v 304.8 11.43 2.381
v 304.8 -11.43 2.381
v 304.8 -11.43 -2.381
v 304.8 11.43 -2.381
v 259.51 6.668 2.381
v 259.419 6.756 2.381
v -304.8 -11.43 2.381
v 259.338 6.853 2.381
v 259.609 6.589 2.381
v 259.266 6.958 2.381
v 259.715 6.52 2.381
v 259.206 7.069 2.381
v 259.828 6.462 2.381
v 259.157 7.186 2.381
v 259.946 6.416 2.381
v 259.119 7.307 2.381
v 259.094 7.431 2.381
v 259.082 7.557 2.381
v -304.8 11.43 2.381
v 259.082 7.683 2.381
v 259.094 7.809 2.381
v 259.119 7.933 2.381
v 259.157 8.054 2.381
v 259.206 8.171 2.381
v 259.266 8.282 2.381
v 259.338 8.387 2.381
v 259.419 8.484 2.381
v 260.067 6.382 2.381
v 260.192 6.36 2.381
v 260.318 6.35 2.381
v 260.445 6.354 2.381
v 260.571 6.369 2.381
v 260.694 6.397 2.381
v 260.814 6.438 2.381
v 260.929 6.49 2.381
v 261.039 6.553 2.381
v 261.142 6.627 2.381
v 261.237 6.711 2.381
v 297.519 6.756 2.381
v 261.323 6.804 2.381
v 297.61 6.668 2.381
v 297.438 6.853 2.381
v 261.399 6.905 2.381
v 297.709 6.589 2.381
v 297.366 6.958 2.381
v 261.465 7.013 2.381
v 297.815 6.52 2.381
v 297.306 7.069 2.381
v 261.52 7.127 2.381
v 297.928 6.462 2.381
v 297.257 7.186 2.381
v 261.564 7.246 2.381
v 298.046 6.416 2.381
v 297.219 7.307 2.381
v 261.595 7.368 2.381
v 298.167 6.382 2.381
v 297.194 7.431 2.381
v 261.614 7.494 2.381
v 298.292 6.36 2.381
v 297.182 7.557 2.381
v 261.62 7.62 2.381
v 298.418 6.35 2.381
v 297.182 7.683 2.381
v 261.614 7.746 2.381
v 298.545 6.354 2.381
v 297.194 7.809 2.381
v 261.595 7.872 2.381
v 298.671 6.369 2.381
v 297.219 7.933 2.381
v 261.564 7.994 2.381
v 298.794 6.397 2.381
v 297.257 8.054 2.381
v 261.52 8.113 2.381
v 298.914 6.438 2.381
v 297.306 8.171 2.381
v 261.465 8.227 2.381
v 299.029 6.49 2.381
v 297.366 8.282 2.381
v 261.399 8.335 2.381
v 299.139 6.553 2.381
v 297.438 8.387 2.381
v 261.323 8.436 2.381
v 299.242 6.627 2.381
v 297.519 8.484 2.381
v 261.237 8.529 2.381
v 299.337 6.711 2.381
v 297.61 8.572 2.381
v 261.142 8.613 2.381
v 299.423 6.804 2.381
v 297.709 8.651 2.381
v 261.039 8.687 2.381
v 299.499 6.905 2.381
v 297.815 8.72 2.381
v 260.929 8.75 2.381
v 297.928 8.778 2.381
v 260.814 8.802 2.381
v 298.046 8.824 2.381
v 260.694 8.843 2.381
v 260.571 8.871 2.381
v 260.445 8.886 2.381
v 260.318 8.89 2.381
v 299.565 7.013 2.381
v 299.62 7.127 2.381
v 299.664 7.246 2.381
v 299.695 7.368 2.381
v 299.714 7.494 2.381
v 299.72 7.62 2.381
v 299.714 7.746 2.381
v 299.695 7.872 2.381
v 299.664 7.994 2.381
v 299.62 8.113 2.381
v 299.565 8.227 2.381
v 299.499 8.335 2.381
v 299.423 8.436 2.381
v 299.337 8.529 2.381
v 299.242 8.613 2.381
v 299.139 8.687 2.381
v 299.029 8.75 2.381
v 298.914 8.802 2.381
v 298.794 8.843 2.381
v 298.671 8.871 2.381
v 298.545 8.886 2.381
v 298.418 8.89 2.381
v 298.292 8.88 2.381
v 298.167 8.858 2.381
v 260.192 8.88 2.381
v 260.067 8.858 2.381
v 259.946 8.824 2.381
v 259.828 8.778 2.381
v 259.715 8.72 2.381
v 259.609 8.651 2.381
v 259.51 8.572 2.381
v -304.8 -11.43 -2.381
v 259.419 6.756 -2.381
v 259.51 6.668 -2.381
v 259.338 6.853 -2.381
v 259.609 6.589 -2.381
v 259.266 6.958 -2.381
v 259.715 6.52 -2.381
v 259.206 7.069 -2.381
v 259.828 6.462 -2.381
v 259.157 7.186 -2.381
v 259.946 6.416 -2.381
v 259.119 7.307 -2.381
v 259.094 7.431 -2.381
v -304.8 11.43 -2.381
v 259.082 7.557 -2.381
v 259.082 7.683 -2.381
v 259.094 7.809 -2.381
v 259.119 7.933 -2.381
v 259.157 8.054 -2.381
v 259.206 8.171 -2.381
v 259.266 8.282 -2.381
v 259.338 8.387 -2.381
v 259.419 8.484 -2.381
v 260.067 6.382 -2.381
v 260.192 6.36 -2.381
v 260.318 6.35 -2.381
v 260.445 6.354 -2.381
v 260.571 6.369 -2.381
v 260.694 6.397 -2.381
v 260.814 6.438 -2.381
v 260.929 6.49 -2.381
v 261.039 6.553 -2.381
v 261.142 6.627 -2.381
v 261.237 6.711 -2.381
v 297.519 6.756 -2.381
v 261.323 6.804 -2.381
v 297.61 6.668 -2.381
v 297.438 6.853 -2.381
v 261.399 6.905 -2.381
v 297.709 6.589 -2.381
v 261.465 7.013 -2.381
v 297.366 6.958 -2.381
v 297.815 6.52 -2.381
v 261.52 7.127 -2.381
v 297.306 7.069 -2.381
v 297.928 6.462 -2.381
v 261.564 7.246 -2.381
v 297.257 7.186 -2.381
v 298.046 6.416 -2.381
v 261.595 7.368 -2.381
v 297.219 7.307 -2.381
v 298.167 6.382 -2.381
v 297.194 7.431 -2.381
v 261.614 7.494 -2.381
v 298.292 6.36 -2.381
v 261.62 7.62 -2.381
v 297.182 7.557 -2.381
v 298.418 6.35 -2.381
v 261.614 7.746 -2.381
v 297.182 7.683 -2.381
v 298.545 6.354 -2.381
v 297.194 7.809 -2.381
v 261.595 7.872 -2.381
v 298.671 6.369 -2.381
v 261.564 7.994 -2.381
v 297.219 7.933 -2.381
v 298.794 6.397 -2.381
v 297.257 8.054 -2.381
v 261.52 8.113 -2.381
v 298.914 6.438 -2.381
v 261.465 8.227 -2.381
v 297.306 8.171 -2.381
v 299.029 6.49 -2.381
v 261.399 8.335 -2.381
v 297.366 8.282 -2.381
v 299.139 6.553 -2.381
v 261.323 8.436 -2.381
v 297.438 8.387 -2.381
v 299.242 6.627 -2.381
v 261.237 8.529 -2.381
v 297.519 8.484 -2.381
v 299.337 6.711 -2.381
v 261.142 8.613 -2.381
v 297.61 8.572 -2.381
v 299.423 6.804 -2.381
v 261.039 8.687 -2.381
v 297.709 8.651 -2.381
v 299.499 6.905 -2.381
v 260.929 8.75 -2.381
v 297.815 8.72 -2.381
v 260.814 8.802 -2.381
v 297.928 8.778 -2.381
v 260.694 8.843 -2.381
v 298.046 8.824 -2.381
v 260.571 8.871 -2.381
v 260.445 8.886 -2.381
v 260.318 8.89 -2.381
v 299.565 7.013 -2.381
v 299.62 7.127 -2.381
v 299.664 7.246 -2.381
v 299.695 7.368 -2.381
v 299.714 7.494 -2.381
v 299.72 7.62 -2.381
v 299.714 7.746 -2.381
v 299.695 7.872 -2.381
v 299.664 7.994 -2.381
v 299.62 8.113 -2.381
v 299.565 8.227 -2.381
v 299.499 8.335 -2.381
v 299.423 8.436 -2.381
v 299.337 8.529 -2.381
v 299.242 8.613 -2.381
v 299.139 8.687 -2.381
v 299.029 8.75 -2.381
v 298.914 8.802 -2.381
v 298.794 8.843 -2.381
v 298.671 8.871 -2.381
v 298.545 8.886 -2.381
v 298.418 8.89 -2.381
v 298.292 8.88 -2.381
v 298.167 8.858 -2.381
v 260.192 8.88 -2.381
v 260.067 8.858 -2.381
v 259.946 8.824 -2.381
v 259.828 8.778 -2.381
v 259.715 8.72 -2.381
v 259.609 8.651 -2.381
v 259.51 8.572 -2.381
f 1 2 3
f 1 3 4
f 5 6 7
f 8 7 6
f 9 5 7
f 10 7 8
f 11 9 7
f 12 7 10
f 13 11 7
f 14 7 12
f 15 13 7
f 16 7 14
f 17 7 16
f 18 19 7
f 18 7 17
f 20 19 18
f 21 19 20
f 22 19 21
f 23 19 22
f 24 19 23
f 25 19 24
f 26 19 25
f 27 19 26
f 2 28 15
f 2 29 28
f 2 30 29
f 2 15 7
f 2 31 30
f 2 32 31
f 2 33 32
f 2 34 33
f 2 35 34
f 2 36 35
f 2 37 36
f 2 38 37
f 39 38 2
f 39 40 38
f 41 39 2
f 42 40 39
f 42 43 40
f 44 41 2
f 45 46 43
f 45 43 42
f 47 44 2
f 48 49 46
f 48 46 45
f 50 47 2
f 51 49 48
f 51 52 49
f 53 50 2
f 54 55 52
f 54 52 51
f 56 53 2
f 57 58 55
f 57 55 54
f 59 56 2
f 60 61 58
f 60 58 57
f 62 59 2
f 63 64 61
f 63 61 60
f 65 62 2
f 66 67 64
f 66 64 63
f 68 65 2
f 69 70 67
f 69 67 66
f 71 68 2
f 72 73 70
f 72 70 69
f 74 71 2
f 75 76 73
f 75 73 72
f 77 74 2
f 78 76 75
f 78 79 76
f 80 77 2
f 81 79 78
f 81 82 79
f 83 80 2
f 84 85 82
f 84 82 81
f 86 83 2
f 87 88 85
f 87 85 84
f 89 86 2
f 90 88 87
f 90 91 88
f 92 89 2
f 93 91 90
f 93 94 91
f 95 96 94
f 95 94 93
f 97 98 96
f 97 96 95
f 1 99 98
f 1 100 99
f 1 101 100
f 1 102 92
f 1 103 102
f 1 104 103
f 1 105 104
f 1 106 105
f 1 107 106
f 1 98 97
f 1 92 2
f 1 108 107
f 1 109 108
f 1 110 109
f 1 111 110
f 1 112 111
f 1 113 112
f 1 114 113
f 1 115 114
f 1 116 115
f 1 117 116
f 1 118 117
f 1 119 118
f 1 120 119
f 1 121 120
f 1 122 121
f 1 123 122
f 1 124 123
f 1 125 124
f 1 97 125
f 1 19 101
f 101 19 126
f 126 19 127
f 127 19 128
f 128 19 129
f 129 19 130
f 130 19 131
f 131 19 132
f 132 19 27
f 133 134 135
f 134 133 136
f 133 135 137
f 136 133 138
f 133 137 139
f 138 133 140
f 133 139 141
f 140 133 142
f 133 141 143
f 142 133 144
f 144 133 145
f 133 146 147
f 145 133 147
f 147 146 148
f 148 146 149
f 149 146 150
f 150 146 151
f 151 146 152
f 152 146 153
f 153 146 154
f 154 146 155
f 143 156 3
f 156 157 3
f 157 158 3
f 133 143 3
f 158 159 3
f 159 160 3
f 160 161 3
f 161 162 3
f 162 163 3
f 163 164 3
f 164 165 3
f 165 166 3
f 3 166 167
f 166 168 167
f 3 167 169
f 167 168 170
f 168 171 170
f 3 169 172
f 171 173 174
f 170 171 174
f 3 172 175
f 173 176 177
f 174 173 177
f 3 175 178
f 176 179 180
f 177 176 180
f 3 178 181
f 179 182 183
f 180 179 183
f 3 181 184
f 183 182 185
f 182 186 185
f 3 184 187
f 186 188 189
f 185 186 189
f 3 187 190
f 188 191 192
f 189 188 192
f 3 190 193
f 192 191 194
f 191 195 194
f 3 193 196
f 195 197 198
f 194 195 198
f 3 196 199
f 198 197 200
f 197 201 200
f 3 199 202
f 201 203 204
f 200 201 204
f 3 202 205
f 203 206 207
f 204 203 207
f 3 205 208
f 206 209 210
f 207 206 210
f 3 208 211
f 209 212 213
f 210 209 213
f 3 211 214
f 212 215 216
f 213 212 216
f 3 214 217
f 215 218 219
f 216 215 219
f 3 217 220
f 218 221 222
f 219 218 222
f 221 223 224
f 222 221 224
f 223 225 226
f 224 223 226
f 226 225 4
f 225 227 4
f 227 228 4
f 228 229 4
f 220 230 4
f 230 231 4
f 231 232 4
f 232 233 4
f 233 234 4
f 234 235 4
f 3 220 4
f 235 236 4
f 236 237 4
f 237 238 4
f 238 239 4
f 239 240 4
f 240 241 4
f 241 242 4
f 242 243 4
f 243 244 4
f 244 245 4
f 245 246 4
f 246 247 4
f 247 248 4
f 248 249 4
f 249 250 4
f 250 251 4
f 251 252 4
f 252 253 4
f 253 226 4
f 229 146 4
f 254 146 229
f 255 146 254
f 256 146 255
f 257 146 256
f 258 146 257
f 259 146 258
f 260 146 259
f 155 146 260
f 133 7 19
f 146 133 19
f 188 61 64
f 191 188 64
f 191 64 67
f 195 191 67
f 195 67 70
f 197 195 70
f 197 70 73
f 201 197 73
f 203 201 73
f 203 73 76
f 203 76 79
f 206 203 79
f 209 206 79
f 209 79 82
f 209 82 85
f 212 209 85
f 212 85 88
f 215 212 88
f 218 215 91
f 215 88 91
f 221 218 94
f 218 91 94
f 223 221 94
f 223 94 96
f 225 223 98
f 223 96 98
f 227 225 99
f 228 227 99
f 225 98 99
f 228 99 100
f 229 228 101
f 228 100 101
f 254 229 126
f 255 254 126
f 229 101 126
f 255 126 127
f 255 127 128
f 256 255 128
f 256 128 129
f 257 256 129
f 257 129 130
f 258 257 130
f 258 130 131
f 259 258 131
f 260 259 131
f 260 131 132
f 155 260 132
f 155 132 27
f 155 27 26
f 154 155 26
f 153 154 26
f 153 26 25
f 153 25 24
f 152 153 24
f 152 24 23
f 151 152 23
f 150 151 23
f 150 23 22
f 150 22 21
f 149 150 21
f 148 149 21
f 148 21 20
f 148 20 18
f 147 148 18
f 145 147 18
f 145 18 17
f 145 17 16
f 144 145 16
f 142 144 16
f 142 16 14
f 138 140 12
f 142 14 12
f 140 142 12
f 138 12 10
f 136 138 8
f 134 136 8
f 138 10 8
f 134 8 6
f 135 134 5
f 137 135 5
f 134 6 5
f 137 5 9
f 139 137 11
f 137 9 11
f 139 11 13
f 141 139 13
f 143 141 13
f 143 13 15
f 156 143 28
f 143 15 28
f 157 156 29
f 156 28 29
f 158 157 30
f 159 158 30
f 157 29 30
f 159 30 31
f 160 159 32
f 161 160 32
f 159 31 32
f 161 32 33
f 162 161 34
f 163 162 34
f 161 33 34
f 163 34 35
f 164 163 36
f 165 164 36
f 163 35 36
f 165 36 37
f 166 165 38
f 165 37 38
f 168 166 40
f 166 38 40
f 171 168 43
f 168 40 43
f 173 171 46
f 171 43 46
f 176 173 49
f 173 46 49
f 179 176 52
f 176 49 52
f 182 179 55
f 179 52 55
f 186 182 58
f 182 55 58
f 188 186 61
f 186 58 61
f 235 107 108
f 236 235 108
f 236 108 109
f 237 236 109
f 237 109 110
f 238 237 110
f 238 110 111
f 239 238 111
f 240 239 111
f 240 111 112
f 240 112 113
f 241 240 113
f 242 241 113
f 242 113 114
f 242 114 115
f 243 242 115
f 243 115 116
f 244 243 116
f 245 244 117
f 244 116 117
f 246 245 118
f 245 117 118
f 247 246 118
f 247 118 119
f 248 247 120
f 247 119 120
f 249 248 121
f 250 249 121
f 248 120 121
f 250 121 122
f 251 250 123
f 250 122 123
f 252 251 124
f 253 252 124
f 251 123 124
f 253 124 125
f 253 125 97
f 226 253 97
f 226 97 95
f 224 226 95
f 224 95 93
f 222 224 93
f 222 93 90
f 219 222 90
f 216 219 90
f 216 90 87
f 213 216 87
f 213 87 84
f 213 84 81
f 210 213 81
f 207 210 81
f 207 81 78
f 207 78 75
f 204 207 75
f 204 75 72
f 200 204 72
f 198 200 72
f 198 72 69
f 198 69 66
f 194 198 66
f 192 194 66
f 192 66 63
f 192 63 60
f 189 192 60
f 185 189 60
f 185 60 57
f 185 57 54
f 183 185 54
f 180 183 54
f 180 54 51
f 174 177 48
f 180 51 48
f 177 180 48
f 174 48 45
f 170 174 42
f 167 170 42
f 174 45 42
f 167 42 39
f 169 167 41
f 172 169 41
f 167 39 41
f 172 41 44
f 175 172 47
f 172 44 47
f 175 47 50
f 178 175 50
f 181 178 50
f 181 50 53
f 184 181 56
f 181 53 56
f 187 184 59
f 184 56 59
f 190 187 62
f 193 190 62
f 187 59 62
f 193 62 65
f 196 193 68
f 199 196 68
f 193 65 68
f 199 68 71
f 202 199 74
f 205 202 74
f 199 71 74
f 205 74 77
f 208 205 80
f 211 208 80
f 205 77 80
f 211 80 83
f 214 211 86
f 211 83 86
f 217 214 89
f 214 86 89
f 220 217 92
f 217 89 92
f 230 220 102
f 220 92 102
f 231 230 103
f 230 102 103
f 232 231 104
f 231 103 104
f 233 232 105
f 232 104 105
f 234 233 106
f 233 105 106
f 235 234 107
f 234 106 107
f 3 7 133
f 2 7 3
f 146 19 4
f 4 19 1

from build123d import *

# Parameters (mm, degrees)
SKETCH1_W           = 609.6
SKETCH1_H           = 22.86
BOSS_EXTRUDE1_DEPTH = 2.38125
SKETCH4_R           = 1.27
CUT_EXTRUDE3_DEPTH  = 5.7625


with BuildPart() as part:
    # Sketch1 → Boss-Extrude1 (new body, symmetric)
    with BuildSketch(Plane.XY):
        Rectangle(SKETCH1_W, SKETCH1_H)
    extrude(amount=BOSS_EXTRUDE1_DEPTH, both=True)

    # Sketch4 → Cut-Extrude3 (cut, through all)
    with BuildSketch(Plane.XY.offset(2.38125)):
        with Locations((260.35, 7.62)):
            Circle(SKETCH4_R)
        with Locations((298.45, 7.62)):
            Circle(SKETCH4_R)
    extrude(amount=-CUT_EXTRUDE3_DEPTH, mode=Mode.SUBTRACT)


solid = part.part
